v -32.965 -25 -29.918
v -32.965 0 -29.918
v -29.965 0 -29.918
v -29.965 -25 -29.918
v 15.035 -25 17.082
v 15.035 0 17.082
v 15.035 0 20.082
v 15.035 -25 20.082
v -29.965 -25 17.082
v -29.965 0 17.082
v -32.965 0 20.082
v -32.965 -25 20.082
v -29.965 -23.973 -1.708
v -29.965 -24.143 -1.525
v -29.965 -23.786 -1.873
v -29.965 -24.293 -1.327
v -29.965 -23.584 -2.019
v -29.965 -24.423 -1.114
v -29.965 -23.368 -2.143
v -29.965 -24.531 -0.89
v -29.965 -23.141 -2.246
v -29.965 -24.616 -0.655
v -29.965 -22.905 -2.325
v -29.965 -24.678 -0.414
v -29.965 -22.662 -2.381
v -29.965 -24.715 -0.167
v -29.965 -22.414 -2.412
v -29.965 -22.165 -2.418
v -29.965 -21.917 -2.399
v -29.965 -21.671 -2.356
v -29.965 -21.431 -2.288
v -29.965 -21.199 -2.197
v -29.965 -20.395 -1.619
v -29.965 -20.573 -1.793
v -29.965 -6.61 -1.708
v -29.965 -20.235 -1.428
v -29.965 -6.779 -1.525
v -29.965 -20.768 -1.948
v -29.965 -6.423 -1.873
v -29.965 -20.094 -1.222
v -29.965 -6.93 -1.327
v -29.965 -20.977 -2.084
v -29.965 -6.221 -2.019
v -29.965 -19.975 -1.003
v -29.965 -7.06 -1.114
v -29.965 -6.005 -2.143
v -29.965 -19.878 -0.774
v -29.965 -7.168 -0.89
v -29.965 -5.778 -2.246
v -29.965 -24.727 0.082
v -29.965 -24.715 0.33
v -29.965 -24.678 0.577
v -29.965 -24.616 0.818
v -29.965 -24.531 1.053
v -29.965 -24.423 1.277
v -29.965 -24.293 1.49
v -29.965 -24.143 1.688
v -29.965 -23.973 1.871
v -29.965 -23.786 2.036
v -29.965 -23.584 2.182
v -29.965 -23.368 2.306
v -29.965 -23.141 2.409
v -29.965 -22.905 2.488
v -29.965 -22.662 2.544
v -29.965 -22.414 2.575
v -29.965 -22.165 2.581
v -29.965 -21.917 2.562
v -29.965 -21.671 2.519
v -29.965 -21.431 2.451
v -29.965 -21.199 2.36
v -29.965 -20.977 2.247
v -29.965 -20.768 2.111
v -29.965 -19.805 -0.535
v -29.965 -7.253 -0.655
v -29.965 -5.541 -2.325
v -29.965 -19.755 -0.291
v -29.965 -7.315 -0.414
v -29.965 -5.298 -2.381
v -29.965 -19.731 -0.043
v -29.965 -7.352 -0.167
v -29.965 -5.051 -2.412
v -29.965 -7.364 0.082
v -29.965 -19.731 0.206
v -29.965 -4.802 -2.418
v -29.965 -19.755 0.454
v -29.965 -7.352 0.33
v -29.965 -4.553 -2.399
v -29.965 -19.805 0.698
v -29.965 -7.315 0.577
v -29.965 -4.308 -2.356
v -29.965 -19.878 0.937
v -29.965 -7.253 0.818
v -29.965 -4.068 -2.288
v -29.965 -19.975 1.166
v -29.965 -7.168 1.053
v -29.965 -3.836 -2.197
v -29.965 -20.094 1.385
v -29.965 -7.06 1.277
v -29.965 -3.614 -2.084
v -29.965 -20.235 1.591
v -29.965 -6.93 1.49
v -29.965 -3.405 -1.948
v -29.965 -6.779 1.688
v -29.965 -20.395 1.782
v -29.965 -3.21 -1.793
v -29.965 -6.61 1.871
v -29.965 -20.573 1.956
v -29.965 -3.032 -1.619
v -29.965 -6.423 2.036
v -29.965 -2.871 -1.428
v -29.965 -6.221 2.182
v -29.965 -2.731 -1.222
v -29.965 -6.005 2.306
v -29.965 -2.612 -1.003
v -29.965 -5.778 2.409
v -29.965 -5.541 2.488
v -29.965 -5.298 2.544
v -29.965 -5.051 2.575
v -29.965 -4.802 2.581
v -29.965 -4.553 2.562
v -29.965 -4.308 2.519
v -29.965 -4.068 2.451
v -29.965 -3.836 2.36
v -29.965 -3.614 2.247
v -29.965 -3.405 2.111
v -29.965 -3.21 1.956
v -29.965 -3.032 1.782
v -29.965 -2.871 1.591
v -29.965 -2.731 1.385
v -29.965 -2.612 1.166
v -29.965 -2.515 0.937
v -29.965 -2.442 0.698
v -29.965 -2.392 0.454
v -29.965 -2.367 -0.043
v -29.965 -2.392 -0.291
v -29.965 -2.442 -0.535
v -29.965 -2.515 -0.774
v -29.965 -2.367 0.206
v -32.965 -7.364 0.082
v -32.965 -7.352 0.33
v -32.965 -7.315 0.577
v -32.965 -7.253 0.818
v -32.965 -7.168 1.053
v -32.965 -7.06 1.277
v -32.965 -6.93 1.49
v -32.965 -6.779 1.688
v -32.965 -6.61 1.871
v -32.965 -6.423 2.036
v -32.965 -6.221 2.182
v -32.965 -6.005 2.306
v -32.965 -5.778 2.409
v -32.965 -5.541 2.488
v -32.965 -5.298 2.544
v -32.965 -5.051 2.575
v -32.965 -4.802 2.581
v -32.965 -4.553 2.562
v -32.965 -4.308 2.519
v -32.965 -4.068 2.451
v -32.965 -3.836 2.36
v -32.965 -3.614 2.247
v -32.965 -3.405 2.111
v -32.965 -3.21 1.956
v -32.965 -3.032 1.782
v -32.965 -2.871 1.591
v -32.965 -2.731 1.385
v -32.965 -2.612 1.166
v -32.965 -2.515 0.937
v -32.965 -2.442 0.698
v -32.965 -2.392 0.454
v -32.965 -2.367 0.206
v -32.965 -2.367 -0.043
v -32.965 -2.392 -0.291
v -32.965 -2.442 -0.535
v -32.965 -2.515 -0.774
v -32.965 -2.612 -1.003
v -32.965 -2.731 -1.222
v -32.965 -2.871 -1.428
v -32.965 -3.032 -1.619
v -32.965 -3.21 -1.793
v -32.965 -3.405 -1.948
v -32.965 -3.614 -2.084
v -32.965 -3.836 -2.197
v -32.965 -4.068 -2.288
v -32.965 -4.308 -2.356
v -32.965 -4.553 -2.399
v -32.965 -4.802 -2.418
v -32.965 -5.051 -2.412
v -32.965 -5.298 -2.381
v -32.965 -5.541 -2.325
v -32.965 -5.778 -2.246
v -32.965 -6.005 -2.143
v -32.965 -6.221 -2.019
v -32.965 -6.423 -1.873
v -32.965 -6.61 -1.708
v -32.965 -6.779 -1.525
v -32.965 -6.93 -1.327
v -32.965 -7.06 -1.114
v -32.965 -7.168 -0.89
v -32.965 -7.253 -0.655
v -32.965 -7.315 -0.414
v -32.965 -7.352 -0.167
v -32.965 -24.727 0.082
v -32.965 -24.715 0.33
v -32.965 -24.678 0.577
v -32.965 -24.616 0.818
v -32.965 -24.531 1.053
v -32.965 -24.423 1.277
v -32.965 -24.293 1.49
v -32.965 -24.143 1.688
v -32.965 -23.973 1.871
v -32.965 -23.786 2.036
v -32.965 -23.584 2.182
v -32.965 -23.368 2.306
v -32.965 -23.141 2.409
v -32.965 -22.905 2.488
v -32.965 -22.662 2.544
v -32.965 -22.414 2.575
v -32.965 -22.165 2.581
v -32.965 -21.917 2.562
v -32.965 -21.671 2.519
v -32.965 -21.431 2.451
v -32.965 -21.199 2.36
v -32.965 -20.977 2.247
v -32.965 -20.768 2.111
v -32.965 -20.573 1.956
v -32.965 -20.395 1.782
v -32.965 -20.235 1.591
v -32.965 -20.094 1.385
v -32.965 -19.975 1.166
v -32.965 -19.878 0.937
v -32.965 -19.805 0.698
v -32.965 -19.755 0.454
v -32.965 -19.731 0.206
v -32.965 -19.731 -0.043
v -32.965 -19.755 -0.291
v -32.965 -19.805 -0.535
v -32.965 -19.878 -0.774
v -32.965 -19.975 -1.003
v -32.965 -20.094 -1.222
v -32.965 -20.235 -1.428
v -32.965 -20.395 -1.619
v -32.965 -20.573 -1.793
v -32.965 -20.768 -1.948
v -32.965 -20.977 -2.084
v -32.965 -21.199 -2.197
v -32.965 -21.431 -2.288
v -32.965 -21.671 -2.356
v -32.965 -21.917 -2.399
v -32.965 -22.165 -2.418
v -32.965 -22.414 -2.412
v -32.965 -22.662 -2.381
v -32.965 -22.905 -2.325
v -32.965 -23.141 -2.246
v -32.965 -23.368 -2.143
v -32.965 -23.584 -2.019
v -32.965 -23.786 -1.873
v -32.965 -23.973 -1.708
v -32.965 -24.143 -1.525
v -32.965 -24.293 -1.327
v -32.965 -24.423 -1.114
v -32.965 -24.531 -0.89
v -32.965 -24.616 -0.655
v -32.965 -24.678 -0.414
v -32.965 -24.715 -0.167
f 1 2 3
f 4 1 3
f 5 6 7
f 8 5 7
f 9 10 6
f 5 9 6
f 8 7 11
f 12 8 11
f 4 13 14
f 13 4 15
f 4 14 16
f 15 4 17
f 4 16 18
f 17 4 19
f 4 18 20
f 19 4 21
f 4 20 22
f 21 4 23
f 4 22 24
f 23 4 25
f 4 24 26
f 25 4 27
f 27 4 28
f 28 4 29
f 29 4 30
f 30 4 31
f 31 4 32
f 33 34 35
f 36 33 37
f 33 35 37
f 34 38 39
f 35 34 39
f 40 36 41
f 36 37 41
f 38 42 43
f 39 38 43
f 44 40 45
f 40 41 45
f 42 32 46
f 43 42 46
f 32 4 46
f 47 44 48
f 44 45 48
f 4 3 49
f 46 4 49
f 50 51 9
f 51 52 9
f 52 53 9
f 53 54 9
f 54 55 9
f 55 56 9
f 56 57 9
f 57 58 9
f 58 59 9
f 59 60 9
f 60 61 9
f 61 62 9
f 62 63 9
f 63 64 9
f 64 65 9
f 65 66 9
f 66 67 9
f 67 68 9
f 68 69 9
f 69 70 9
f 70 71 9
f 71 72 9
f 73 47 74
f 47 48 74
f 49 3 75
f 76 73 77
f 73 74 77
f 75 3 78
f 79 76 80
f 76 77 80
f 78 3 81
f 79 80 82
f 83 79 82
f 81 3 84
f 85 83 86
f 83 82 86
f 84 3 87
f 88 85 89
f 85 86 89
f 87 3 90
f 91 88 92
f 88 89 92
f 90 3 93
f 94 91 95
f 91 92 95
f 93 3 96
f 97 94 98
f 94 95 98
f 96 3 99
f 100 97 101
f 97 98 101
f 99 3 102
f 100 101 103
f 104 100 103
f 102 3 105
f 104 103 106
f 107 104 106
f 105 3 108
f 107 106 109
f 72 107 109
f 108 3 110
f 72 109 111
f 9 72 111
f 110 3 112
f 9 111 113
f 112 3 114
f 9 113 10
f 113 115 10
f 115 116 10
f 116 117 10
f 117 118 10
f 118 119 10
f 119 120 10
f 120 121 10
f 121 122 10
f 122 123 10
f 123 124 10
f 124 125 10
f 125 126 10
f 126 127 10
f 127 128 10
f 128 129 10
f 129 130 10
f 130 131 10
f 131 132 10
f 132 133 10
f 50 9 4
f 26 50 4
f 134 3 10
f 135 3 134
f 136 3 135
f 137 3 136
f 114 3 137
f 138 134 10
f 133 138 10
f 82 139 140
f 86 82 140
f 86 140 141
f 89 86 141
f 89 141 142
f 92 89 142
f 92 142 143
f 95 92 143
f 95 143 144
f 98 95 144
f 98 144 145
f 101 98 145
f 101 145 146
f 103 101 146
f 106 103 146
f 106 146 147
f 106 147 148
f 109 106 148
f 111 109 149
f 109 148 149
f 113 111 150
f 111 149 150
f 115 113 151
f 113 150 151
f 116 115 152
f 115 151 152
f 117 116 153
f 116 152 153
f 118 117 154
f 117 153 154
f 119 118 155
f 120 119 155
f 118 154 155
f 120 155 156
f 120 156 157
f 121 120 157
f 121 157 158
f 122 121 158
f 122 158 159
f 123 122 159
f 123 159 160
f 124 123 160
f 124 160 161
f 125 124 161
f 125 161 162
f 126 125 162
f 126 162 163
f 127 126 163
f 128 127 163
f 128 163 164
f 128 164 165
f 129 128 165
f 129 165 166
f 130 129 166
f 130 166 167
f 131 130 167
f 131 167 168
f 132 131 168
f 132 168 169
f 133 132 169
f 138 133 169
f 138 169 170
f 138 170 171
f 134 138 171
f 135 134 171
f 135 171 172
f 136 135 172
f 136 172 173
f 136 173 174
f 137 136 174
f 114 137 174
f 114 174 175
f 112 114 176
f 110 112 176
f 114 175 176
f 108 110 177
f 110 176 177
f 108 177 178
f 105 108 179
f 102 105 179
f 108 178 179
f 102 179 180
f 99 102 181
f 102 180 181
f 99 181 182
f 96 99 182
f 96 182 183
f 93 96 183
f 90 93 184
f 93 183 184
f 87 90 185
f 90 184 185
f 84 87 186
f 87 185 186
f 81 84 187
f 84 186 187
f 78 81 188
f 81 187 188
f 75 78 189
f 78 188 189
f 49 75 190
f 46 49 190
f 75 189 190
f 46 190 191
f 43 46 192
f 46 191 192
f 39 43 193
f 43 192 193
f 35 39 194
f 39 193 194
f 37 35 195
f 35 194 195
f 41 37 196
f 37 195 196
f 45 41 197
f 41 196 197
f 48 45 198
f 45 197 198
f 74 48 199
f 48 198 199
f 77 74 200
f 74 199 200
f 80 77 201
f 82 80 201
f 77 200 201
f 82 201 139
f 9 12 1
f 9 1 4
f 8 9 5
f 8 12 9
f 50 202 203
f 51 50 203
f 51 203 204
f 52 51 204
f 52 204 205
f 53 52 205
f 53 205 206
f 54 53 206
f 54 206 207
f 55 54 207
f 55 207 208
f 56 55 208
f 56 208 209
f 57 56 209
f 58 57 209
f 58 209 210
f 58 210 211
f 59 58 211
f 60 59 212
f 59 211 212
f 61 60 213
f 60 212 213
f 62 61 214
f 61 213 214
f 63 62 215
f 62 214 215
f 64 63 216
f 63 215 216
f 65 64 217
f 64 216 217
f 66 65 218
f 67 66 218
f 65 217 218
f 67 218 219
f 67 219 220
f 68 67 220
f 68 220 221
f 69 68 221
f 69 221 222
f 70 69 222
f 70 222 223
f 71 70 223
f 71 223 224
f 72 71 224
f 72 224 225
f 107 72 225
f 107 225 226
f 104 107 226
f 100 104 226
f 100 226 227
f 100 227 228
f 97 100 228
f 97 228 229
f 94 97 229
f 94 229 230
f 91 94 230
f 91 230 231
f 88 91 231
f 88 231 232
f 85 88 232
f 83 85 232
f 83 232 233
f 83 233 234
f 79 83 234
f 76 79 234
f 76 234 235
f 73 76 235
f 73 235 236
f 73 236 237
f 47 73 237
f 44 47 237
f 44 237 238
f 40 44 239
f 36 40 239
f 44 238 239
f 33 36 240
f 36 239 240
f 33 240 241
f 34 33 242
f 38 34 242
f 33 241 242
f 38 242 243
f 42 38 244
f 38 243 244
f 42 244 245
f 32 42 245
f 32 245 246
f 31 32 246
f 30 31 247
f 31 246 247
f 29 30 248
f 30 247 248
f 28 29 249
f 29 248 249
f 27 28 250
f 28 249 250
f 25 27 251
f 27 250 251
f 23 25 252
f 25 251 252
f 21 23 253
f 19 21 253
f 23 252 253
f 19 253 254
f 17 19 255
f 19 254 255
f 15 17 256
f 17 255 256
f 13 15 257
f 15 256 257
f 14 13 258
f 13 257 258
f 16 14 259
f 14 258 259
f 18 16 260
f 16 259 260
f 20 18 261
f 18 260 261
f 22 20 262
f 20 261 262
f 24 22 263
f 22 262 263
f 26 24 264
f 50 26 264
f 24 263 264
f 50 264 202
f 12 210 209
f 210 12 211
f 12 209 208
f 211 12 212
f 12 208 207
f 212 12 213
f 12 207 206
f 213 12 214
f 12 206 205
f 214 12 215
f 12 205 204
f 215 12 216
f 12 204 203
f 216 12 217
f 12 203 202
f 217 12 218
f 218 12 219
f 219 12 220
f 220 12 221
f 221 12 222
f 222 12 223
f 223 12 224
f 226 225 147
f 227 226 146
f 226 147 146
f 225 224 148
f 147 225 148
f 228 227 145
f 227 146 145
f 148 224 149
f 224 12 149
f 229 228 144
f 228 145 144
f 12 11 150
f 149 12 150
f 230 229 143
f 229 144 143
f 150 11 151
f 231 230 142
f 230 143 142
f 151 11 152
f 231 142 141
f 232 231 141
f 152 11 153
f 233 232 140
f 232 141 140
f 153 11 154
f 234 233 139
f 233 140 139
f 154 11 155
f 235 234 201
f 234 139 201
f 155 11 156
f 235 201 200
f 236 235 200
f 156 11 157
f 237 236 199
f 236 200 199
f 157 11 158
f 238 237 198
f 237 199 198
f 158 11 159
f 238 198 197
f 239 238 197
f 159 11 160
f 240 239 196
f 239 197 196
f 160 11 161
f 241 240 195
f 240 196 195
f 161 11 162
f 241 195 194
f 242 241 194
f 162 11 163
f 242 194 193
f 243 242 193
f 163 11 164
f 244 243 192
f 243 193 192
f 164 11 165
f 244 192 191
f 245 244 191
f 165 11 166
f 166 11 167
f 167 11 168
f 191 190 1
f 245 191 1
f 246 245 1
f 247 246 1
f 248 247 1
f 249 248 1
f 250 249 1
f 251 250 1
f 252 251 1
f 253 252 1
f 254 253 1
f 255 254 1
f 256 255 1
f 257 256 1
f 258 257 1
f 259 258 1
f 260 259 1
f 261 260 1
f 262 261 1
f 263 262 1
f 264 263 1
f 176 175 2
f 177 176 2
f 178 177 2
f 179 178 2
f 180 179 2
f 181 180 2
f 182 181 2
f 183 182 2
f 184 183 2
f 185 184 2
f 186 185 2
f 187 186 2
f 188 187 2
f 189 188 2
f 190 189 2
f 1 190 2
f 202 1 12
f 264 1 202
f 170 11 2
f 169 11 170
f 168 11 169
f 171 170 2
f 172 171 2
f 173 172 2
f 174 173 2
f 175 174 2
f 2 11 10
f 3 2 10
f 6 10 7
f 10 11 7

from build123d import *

# Parameters (mm, degrees)
F1_DEPTH = 25
F2_R     = 2.5
F3_DEPTH = 25


with BuildPart() as f1:
    # F0 (on Front) → F1 (new body)
    with BuildSketch(Plane.XZ):
        Polygon((15.035118, 20.081509), (-32.964882, 20.081509), (-32.964882, -29.918491), (-29.964882, -29.918491), (-29.964882, 17.081509), (15.035118, 17.081509), align=None)
    extrude(amount=F1_DEPTH)

    # F2 (on face) → F3 (cut)
    with BuildSketch(Plane(origin=(-32.964882, 0, 0), x_dir=(0, -1, 0), z_dir=(-1, 0, 0))):
        with Locations((22.227423, 0.081509)):
            Circle(F2_R)
        with Locations((4.864288, 0.081509)):
            Circle(F2_R)
    extrude(amount=-F3_DEPTH, mode=Mode.SUBTRACT)


solid = f1.part
